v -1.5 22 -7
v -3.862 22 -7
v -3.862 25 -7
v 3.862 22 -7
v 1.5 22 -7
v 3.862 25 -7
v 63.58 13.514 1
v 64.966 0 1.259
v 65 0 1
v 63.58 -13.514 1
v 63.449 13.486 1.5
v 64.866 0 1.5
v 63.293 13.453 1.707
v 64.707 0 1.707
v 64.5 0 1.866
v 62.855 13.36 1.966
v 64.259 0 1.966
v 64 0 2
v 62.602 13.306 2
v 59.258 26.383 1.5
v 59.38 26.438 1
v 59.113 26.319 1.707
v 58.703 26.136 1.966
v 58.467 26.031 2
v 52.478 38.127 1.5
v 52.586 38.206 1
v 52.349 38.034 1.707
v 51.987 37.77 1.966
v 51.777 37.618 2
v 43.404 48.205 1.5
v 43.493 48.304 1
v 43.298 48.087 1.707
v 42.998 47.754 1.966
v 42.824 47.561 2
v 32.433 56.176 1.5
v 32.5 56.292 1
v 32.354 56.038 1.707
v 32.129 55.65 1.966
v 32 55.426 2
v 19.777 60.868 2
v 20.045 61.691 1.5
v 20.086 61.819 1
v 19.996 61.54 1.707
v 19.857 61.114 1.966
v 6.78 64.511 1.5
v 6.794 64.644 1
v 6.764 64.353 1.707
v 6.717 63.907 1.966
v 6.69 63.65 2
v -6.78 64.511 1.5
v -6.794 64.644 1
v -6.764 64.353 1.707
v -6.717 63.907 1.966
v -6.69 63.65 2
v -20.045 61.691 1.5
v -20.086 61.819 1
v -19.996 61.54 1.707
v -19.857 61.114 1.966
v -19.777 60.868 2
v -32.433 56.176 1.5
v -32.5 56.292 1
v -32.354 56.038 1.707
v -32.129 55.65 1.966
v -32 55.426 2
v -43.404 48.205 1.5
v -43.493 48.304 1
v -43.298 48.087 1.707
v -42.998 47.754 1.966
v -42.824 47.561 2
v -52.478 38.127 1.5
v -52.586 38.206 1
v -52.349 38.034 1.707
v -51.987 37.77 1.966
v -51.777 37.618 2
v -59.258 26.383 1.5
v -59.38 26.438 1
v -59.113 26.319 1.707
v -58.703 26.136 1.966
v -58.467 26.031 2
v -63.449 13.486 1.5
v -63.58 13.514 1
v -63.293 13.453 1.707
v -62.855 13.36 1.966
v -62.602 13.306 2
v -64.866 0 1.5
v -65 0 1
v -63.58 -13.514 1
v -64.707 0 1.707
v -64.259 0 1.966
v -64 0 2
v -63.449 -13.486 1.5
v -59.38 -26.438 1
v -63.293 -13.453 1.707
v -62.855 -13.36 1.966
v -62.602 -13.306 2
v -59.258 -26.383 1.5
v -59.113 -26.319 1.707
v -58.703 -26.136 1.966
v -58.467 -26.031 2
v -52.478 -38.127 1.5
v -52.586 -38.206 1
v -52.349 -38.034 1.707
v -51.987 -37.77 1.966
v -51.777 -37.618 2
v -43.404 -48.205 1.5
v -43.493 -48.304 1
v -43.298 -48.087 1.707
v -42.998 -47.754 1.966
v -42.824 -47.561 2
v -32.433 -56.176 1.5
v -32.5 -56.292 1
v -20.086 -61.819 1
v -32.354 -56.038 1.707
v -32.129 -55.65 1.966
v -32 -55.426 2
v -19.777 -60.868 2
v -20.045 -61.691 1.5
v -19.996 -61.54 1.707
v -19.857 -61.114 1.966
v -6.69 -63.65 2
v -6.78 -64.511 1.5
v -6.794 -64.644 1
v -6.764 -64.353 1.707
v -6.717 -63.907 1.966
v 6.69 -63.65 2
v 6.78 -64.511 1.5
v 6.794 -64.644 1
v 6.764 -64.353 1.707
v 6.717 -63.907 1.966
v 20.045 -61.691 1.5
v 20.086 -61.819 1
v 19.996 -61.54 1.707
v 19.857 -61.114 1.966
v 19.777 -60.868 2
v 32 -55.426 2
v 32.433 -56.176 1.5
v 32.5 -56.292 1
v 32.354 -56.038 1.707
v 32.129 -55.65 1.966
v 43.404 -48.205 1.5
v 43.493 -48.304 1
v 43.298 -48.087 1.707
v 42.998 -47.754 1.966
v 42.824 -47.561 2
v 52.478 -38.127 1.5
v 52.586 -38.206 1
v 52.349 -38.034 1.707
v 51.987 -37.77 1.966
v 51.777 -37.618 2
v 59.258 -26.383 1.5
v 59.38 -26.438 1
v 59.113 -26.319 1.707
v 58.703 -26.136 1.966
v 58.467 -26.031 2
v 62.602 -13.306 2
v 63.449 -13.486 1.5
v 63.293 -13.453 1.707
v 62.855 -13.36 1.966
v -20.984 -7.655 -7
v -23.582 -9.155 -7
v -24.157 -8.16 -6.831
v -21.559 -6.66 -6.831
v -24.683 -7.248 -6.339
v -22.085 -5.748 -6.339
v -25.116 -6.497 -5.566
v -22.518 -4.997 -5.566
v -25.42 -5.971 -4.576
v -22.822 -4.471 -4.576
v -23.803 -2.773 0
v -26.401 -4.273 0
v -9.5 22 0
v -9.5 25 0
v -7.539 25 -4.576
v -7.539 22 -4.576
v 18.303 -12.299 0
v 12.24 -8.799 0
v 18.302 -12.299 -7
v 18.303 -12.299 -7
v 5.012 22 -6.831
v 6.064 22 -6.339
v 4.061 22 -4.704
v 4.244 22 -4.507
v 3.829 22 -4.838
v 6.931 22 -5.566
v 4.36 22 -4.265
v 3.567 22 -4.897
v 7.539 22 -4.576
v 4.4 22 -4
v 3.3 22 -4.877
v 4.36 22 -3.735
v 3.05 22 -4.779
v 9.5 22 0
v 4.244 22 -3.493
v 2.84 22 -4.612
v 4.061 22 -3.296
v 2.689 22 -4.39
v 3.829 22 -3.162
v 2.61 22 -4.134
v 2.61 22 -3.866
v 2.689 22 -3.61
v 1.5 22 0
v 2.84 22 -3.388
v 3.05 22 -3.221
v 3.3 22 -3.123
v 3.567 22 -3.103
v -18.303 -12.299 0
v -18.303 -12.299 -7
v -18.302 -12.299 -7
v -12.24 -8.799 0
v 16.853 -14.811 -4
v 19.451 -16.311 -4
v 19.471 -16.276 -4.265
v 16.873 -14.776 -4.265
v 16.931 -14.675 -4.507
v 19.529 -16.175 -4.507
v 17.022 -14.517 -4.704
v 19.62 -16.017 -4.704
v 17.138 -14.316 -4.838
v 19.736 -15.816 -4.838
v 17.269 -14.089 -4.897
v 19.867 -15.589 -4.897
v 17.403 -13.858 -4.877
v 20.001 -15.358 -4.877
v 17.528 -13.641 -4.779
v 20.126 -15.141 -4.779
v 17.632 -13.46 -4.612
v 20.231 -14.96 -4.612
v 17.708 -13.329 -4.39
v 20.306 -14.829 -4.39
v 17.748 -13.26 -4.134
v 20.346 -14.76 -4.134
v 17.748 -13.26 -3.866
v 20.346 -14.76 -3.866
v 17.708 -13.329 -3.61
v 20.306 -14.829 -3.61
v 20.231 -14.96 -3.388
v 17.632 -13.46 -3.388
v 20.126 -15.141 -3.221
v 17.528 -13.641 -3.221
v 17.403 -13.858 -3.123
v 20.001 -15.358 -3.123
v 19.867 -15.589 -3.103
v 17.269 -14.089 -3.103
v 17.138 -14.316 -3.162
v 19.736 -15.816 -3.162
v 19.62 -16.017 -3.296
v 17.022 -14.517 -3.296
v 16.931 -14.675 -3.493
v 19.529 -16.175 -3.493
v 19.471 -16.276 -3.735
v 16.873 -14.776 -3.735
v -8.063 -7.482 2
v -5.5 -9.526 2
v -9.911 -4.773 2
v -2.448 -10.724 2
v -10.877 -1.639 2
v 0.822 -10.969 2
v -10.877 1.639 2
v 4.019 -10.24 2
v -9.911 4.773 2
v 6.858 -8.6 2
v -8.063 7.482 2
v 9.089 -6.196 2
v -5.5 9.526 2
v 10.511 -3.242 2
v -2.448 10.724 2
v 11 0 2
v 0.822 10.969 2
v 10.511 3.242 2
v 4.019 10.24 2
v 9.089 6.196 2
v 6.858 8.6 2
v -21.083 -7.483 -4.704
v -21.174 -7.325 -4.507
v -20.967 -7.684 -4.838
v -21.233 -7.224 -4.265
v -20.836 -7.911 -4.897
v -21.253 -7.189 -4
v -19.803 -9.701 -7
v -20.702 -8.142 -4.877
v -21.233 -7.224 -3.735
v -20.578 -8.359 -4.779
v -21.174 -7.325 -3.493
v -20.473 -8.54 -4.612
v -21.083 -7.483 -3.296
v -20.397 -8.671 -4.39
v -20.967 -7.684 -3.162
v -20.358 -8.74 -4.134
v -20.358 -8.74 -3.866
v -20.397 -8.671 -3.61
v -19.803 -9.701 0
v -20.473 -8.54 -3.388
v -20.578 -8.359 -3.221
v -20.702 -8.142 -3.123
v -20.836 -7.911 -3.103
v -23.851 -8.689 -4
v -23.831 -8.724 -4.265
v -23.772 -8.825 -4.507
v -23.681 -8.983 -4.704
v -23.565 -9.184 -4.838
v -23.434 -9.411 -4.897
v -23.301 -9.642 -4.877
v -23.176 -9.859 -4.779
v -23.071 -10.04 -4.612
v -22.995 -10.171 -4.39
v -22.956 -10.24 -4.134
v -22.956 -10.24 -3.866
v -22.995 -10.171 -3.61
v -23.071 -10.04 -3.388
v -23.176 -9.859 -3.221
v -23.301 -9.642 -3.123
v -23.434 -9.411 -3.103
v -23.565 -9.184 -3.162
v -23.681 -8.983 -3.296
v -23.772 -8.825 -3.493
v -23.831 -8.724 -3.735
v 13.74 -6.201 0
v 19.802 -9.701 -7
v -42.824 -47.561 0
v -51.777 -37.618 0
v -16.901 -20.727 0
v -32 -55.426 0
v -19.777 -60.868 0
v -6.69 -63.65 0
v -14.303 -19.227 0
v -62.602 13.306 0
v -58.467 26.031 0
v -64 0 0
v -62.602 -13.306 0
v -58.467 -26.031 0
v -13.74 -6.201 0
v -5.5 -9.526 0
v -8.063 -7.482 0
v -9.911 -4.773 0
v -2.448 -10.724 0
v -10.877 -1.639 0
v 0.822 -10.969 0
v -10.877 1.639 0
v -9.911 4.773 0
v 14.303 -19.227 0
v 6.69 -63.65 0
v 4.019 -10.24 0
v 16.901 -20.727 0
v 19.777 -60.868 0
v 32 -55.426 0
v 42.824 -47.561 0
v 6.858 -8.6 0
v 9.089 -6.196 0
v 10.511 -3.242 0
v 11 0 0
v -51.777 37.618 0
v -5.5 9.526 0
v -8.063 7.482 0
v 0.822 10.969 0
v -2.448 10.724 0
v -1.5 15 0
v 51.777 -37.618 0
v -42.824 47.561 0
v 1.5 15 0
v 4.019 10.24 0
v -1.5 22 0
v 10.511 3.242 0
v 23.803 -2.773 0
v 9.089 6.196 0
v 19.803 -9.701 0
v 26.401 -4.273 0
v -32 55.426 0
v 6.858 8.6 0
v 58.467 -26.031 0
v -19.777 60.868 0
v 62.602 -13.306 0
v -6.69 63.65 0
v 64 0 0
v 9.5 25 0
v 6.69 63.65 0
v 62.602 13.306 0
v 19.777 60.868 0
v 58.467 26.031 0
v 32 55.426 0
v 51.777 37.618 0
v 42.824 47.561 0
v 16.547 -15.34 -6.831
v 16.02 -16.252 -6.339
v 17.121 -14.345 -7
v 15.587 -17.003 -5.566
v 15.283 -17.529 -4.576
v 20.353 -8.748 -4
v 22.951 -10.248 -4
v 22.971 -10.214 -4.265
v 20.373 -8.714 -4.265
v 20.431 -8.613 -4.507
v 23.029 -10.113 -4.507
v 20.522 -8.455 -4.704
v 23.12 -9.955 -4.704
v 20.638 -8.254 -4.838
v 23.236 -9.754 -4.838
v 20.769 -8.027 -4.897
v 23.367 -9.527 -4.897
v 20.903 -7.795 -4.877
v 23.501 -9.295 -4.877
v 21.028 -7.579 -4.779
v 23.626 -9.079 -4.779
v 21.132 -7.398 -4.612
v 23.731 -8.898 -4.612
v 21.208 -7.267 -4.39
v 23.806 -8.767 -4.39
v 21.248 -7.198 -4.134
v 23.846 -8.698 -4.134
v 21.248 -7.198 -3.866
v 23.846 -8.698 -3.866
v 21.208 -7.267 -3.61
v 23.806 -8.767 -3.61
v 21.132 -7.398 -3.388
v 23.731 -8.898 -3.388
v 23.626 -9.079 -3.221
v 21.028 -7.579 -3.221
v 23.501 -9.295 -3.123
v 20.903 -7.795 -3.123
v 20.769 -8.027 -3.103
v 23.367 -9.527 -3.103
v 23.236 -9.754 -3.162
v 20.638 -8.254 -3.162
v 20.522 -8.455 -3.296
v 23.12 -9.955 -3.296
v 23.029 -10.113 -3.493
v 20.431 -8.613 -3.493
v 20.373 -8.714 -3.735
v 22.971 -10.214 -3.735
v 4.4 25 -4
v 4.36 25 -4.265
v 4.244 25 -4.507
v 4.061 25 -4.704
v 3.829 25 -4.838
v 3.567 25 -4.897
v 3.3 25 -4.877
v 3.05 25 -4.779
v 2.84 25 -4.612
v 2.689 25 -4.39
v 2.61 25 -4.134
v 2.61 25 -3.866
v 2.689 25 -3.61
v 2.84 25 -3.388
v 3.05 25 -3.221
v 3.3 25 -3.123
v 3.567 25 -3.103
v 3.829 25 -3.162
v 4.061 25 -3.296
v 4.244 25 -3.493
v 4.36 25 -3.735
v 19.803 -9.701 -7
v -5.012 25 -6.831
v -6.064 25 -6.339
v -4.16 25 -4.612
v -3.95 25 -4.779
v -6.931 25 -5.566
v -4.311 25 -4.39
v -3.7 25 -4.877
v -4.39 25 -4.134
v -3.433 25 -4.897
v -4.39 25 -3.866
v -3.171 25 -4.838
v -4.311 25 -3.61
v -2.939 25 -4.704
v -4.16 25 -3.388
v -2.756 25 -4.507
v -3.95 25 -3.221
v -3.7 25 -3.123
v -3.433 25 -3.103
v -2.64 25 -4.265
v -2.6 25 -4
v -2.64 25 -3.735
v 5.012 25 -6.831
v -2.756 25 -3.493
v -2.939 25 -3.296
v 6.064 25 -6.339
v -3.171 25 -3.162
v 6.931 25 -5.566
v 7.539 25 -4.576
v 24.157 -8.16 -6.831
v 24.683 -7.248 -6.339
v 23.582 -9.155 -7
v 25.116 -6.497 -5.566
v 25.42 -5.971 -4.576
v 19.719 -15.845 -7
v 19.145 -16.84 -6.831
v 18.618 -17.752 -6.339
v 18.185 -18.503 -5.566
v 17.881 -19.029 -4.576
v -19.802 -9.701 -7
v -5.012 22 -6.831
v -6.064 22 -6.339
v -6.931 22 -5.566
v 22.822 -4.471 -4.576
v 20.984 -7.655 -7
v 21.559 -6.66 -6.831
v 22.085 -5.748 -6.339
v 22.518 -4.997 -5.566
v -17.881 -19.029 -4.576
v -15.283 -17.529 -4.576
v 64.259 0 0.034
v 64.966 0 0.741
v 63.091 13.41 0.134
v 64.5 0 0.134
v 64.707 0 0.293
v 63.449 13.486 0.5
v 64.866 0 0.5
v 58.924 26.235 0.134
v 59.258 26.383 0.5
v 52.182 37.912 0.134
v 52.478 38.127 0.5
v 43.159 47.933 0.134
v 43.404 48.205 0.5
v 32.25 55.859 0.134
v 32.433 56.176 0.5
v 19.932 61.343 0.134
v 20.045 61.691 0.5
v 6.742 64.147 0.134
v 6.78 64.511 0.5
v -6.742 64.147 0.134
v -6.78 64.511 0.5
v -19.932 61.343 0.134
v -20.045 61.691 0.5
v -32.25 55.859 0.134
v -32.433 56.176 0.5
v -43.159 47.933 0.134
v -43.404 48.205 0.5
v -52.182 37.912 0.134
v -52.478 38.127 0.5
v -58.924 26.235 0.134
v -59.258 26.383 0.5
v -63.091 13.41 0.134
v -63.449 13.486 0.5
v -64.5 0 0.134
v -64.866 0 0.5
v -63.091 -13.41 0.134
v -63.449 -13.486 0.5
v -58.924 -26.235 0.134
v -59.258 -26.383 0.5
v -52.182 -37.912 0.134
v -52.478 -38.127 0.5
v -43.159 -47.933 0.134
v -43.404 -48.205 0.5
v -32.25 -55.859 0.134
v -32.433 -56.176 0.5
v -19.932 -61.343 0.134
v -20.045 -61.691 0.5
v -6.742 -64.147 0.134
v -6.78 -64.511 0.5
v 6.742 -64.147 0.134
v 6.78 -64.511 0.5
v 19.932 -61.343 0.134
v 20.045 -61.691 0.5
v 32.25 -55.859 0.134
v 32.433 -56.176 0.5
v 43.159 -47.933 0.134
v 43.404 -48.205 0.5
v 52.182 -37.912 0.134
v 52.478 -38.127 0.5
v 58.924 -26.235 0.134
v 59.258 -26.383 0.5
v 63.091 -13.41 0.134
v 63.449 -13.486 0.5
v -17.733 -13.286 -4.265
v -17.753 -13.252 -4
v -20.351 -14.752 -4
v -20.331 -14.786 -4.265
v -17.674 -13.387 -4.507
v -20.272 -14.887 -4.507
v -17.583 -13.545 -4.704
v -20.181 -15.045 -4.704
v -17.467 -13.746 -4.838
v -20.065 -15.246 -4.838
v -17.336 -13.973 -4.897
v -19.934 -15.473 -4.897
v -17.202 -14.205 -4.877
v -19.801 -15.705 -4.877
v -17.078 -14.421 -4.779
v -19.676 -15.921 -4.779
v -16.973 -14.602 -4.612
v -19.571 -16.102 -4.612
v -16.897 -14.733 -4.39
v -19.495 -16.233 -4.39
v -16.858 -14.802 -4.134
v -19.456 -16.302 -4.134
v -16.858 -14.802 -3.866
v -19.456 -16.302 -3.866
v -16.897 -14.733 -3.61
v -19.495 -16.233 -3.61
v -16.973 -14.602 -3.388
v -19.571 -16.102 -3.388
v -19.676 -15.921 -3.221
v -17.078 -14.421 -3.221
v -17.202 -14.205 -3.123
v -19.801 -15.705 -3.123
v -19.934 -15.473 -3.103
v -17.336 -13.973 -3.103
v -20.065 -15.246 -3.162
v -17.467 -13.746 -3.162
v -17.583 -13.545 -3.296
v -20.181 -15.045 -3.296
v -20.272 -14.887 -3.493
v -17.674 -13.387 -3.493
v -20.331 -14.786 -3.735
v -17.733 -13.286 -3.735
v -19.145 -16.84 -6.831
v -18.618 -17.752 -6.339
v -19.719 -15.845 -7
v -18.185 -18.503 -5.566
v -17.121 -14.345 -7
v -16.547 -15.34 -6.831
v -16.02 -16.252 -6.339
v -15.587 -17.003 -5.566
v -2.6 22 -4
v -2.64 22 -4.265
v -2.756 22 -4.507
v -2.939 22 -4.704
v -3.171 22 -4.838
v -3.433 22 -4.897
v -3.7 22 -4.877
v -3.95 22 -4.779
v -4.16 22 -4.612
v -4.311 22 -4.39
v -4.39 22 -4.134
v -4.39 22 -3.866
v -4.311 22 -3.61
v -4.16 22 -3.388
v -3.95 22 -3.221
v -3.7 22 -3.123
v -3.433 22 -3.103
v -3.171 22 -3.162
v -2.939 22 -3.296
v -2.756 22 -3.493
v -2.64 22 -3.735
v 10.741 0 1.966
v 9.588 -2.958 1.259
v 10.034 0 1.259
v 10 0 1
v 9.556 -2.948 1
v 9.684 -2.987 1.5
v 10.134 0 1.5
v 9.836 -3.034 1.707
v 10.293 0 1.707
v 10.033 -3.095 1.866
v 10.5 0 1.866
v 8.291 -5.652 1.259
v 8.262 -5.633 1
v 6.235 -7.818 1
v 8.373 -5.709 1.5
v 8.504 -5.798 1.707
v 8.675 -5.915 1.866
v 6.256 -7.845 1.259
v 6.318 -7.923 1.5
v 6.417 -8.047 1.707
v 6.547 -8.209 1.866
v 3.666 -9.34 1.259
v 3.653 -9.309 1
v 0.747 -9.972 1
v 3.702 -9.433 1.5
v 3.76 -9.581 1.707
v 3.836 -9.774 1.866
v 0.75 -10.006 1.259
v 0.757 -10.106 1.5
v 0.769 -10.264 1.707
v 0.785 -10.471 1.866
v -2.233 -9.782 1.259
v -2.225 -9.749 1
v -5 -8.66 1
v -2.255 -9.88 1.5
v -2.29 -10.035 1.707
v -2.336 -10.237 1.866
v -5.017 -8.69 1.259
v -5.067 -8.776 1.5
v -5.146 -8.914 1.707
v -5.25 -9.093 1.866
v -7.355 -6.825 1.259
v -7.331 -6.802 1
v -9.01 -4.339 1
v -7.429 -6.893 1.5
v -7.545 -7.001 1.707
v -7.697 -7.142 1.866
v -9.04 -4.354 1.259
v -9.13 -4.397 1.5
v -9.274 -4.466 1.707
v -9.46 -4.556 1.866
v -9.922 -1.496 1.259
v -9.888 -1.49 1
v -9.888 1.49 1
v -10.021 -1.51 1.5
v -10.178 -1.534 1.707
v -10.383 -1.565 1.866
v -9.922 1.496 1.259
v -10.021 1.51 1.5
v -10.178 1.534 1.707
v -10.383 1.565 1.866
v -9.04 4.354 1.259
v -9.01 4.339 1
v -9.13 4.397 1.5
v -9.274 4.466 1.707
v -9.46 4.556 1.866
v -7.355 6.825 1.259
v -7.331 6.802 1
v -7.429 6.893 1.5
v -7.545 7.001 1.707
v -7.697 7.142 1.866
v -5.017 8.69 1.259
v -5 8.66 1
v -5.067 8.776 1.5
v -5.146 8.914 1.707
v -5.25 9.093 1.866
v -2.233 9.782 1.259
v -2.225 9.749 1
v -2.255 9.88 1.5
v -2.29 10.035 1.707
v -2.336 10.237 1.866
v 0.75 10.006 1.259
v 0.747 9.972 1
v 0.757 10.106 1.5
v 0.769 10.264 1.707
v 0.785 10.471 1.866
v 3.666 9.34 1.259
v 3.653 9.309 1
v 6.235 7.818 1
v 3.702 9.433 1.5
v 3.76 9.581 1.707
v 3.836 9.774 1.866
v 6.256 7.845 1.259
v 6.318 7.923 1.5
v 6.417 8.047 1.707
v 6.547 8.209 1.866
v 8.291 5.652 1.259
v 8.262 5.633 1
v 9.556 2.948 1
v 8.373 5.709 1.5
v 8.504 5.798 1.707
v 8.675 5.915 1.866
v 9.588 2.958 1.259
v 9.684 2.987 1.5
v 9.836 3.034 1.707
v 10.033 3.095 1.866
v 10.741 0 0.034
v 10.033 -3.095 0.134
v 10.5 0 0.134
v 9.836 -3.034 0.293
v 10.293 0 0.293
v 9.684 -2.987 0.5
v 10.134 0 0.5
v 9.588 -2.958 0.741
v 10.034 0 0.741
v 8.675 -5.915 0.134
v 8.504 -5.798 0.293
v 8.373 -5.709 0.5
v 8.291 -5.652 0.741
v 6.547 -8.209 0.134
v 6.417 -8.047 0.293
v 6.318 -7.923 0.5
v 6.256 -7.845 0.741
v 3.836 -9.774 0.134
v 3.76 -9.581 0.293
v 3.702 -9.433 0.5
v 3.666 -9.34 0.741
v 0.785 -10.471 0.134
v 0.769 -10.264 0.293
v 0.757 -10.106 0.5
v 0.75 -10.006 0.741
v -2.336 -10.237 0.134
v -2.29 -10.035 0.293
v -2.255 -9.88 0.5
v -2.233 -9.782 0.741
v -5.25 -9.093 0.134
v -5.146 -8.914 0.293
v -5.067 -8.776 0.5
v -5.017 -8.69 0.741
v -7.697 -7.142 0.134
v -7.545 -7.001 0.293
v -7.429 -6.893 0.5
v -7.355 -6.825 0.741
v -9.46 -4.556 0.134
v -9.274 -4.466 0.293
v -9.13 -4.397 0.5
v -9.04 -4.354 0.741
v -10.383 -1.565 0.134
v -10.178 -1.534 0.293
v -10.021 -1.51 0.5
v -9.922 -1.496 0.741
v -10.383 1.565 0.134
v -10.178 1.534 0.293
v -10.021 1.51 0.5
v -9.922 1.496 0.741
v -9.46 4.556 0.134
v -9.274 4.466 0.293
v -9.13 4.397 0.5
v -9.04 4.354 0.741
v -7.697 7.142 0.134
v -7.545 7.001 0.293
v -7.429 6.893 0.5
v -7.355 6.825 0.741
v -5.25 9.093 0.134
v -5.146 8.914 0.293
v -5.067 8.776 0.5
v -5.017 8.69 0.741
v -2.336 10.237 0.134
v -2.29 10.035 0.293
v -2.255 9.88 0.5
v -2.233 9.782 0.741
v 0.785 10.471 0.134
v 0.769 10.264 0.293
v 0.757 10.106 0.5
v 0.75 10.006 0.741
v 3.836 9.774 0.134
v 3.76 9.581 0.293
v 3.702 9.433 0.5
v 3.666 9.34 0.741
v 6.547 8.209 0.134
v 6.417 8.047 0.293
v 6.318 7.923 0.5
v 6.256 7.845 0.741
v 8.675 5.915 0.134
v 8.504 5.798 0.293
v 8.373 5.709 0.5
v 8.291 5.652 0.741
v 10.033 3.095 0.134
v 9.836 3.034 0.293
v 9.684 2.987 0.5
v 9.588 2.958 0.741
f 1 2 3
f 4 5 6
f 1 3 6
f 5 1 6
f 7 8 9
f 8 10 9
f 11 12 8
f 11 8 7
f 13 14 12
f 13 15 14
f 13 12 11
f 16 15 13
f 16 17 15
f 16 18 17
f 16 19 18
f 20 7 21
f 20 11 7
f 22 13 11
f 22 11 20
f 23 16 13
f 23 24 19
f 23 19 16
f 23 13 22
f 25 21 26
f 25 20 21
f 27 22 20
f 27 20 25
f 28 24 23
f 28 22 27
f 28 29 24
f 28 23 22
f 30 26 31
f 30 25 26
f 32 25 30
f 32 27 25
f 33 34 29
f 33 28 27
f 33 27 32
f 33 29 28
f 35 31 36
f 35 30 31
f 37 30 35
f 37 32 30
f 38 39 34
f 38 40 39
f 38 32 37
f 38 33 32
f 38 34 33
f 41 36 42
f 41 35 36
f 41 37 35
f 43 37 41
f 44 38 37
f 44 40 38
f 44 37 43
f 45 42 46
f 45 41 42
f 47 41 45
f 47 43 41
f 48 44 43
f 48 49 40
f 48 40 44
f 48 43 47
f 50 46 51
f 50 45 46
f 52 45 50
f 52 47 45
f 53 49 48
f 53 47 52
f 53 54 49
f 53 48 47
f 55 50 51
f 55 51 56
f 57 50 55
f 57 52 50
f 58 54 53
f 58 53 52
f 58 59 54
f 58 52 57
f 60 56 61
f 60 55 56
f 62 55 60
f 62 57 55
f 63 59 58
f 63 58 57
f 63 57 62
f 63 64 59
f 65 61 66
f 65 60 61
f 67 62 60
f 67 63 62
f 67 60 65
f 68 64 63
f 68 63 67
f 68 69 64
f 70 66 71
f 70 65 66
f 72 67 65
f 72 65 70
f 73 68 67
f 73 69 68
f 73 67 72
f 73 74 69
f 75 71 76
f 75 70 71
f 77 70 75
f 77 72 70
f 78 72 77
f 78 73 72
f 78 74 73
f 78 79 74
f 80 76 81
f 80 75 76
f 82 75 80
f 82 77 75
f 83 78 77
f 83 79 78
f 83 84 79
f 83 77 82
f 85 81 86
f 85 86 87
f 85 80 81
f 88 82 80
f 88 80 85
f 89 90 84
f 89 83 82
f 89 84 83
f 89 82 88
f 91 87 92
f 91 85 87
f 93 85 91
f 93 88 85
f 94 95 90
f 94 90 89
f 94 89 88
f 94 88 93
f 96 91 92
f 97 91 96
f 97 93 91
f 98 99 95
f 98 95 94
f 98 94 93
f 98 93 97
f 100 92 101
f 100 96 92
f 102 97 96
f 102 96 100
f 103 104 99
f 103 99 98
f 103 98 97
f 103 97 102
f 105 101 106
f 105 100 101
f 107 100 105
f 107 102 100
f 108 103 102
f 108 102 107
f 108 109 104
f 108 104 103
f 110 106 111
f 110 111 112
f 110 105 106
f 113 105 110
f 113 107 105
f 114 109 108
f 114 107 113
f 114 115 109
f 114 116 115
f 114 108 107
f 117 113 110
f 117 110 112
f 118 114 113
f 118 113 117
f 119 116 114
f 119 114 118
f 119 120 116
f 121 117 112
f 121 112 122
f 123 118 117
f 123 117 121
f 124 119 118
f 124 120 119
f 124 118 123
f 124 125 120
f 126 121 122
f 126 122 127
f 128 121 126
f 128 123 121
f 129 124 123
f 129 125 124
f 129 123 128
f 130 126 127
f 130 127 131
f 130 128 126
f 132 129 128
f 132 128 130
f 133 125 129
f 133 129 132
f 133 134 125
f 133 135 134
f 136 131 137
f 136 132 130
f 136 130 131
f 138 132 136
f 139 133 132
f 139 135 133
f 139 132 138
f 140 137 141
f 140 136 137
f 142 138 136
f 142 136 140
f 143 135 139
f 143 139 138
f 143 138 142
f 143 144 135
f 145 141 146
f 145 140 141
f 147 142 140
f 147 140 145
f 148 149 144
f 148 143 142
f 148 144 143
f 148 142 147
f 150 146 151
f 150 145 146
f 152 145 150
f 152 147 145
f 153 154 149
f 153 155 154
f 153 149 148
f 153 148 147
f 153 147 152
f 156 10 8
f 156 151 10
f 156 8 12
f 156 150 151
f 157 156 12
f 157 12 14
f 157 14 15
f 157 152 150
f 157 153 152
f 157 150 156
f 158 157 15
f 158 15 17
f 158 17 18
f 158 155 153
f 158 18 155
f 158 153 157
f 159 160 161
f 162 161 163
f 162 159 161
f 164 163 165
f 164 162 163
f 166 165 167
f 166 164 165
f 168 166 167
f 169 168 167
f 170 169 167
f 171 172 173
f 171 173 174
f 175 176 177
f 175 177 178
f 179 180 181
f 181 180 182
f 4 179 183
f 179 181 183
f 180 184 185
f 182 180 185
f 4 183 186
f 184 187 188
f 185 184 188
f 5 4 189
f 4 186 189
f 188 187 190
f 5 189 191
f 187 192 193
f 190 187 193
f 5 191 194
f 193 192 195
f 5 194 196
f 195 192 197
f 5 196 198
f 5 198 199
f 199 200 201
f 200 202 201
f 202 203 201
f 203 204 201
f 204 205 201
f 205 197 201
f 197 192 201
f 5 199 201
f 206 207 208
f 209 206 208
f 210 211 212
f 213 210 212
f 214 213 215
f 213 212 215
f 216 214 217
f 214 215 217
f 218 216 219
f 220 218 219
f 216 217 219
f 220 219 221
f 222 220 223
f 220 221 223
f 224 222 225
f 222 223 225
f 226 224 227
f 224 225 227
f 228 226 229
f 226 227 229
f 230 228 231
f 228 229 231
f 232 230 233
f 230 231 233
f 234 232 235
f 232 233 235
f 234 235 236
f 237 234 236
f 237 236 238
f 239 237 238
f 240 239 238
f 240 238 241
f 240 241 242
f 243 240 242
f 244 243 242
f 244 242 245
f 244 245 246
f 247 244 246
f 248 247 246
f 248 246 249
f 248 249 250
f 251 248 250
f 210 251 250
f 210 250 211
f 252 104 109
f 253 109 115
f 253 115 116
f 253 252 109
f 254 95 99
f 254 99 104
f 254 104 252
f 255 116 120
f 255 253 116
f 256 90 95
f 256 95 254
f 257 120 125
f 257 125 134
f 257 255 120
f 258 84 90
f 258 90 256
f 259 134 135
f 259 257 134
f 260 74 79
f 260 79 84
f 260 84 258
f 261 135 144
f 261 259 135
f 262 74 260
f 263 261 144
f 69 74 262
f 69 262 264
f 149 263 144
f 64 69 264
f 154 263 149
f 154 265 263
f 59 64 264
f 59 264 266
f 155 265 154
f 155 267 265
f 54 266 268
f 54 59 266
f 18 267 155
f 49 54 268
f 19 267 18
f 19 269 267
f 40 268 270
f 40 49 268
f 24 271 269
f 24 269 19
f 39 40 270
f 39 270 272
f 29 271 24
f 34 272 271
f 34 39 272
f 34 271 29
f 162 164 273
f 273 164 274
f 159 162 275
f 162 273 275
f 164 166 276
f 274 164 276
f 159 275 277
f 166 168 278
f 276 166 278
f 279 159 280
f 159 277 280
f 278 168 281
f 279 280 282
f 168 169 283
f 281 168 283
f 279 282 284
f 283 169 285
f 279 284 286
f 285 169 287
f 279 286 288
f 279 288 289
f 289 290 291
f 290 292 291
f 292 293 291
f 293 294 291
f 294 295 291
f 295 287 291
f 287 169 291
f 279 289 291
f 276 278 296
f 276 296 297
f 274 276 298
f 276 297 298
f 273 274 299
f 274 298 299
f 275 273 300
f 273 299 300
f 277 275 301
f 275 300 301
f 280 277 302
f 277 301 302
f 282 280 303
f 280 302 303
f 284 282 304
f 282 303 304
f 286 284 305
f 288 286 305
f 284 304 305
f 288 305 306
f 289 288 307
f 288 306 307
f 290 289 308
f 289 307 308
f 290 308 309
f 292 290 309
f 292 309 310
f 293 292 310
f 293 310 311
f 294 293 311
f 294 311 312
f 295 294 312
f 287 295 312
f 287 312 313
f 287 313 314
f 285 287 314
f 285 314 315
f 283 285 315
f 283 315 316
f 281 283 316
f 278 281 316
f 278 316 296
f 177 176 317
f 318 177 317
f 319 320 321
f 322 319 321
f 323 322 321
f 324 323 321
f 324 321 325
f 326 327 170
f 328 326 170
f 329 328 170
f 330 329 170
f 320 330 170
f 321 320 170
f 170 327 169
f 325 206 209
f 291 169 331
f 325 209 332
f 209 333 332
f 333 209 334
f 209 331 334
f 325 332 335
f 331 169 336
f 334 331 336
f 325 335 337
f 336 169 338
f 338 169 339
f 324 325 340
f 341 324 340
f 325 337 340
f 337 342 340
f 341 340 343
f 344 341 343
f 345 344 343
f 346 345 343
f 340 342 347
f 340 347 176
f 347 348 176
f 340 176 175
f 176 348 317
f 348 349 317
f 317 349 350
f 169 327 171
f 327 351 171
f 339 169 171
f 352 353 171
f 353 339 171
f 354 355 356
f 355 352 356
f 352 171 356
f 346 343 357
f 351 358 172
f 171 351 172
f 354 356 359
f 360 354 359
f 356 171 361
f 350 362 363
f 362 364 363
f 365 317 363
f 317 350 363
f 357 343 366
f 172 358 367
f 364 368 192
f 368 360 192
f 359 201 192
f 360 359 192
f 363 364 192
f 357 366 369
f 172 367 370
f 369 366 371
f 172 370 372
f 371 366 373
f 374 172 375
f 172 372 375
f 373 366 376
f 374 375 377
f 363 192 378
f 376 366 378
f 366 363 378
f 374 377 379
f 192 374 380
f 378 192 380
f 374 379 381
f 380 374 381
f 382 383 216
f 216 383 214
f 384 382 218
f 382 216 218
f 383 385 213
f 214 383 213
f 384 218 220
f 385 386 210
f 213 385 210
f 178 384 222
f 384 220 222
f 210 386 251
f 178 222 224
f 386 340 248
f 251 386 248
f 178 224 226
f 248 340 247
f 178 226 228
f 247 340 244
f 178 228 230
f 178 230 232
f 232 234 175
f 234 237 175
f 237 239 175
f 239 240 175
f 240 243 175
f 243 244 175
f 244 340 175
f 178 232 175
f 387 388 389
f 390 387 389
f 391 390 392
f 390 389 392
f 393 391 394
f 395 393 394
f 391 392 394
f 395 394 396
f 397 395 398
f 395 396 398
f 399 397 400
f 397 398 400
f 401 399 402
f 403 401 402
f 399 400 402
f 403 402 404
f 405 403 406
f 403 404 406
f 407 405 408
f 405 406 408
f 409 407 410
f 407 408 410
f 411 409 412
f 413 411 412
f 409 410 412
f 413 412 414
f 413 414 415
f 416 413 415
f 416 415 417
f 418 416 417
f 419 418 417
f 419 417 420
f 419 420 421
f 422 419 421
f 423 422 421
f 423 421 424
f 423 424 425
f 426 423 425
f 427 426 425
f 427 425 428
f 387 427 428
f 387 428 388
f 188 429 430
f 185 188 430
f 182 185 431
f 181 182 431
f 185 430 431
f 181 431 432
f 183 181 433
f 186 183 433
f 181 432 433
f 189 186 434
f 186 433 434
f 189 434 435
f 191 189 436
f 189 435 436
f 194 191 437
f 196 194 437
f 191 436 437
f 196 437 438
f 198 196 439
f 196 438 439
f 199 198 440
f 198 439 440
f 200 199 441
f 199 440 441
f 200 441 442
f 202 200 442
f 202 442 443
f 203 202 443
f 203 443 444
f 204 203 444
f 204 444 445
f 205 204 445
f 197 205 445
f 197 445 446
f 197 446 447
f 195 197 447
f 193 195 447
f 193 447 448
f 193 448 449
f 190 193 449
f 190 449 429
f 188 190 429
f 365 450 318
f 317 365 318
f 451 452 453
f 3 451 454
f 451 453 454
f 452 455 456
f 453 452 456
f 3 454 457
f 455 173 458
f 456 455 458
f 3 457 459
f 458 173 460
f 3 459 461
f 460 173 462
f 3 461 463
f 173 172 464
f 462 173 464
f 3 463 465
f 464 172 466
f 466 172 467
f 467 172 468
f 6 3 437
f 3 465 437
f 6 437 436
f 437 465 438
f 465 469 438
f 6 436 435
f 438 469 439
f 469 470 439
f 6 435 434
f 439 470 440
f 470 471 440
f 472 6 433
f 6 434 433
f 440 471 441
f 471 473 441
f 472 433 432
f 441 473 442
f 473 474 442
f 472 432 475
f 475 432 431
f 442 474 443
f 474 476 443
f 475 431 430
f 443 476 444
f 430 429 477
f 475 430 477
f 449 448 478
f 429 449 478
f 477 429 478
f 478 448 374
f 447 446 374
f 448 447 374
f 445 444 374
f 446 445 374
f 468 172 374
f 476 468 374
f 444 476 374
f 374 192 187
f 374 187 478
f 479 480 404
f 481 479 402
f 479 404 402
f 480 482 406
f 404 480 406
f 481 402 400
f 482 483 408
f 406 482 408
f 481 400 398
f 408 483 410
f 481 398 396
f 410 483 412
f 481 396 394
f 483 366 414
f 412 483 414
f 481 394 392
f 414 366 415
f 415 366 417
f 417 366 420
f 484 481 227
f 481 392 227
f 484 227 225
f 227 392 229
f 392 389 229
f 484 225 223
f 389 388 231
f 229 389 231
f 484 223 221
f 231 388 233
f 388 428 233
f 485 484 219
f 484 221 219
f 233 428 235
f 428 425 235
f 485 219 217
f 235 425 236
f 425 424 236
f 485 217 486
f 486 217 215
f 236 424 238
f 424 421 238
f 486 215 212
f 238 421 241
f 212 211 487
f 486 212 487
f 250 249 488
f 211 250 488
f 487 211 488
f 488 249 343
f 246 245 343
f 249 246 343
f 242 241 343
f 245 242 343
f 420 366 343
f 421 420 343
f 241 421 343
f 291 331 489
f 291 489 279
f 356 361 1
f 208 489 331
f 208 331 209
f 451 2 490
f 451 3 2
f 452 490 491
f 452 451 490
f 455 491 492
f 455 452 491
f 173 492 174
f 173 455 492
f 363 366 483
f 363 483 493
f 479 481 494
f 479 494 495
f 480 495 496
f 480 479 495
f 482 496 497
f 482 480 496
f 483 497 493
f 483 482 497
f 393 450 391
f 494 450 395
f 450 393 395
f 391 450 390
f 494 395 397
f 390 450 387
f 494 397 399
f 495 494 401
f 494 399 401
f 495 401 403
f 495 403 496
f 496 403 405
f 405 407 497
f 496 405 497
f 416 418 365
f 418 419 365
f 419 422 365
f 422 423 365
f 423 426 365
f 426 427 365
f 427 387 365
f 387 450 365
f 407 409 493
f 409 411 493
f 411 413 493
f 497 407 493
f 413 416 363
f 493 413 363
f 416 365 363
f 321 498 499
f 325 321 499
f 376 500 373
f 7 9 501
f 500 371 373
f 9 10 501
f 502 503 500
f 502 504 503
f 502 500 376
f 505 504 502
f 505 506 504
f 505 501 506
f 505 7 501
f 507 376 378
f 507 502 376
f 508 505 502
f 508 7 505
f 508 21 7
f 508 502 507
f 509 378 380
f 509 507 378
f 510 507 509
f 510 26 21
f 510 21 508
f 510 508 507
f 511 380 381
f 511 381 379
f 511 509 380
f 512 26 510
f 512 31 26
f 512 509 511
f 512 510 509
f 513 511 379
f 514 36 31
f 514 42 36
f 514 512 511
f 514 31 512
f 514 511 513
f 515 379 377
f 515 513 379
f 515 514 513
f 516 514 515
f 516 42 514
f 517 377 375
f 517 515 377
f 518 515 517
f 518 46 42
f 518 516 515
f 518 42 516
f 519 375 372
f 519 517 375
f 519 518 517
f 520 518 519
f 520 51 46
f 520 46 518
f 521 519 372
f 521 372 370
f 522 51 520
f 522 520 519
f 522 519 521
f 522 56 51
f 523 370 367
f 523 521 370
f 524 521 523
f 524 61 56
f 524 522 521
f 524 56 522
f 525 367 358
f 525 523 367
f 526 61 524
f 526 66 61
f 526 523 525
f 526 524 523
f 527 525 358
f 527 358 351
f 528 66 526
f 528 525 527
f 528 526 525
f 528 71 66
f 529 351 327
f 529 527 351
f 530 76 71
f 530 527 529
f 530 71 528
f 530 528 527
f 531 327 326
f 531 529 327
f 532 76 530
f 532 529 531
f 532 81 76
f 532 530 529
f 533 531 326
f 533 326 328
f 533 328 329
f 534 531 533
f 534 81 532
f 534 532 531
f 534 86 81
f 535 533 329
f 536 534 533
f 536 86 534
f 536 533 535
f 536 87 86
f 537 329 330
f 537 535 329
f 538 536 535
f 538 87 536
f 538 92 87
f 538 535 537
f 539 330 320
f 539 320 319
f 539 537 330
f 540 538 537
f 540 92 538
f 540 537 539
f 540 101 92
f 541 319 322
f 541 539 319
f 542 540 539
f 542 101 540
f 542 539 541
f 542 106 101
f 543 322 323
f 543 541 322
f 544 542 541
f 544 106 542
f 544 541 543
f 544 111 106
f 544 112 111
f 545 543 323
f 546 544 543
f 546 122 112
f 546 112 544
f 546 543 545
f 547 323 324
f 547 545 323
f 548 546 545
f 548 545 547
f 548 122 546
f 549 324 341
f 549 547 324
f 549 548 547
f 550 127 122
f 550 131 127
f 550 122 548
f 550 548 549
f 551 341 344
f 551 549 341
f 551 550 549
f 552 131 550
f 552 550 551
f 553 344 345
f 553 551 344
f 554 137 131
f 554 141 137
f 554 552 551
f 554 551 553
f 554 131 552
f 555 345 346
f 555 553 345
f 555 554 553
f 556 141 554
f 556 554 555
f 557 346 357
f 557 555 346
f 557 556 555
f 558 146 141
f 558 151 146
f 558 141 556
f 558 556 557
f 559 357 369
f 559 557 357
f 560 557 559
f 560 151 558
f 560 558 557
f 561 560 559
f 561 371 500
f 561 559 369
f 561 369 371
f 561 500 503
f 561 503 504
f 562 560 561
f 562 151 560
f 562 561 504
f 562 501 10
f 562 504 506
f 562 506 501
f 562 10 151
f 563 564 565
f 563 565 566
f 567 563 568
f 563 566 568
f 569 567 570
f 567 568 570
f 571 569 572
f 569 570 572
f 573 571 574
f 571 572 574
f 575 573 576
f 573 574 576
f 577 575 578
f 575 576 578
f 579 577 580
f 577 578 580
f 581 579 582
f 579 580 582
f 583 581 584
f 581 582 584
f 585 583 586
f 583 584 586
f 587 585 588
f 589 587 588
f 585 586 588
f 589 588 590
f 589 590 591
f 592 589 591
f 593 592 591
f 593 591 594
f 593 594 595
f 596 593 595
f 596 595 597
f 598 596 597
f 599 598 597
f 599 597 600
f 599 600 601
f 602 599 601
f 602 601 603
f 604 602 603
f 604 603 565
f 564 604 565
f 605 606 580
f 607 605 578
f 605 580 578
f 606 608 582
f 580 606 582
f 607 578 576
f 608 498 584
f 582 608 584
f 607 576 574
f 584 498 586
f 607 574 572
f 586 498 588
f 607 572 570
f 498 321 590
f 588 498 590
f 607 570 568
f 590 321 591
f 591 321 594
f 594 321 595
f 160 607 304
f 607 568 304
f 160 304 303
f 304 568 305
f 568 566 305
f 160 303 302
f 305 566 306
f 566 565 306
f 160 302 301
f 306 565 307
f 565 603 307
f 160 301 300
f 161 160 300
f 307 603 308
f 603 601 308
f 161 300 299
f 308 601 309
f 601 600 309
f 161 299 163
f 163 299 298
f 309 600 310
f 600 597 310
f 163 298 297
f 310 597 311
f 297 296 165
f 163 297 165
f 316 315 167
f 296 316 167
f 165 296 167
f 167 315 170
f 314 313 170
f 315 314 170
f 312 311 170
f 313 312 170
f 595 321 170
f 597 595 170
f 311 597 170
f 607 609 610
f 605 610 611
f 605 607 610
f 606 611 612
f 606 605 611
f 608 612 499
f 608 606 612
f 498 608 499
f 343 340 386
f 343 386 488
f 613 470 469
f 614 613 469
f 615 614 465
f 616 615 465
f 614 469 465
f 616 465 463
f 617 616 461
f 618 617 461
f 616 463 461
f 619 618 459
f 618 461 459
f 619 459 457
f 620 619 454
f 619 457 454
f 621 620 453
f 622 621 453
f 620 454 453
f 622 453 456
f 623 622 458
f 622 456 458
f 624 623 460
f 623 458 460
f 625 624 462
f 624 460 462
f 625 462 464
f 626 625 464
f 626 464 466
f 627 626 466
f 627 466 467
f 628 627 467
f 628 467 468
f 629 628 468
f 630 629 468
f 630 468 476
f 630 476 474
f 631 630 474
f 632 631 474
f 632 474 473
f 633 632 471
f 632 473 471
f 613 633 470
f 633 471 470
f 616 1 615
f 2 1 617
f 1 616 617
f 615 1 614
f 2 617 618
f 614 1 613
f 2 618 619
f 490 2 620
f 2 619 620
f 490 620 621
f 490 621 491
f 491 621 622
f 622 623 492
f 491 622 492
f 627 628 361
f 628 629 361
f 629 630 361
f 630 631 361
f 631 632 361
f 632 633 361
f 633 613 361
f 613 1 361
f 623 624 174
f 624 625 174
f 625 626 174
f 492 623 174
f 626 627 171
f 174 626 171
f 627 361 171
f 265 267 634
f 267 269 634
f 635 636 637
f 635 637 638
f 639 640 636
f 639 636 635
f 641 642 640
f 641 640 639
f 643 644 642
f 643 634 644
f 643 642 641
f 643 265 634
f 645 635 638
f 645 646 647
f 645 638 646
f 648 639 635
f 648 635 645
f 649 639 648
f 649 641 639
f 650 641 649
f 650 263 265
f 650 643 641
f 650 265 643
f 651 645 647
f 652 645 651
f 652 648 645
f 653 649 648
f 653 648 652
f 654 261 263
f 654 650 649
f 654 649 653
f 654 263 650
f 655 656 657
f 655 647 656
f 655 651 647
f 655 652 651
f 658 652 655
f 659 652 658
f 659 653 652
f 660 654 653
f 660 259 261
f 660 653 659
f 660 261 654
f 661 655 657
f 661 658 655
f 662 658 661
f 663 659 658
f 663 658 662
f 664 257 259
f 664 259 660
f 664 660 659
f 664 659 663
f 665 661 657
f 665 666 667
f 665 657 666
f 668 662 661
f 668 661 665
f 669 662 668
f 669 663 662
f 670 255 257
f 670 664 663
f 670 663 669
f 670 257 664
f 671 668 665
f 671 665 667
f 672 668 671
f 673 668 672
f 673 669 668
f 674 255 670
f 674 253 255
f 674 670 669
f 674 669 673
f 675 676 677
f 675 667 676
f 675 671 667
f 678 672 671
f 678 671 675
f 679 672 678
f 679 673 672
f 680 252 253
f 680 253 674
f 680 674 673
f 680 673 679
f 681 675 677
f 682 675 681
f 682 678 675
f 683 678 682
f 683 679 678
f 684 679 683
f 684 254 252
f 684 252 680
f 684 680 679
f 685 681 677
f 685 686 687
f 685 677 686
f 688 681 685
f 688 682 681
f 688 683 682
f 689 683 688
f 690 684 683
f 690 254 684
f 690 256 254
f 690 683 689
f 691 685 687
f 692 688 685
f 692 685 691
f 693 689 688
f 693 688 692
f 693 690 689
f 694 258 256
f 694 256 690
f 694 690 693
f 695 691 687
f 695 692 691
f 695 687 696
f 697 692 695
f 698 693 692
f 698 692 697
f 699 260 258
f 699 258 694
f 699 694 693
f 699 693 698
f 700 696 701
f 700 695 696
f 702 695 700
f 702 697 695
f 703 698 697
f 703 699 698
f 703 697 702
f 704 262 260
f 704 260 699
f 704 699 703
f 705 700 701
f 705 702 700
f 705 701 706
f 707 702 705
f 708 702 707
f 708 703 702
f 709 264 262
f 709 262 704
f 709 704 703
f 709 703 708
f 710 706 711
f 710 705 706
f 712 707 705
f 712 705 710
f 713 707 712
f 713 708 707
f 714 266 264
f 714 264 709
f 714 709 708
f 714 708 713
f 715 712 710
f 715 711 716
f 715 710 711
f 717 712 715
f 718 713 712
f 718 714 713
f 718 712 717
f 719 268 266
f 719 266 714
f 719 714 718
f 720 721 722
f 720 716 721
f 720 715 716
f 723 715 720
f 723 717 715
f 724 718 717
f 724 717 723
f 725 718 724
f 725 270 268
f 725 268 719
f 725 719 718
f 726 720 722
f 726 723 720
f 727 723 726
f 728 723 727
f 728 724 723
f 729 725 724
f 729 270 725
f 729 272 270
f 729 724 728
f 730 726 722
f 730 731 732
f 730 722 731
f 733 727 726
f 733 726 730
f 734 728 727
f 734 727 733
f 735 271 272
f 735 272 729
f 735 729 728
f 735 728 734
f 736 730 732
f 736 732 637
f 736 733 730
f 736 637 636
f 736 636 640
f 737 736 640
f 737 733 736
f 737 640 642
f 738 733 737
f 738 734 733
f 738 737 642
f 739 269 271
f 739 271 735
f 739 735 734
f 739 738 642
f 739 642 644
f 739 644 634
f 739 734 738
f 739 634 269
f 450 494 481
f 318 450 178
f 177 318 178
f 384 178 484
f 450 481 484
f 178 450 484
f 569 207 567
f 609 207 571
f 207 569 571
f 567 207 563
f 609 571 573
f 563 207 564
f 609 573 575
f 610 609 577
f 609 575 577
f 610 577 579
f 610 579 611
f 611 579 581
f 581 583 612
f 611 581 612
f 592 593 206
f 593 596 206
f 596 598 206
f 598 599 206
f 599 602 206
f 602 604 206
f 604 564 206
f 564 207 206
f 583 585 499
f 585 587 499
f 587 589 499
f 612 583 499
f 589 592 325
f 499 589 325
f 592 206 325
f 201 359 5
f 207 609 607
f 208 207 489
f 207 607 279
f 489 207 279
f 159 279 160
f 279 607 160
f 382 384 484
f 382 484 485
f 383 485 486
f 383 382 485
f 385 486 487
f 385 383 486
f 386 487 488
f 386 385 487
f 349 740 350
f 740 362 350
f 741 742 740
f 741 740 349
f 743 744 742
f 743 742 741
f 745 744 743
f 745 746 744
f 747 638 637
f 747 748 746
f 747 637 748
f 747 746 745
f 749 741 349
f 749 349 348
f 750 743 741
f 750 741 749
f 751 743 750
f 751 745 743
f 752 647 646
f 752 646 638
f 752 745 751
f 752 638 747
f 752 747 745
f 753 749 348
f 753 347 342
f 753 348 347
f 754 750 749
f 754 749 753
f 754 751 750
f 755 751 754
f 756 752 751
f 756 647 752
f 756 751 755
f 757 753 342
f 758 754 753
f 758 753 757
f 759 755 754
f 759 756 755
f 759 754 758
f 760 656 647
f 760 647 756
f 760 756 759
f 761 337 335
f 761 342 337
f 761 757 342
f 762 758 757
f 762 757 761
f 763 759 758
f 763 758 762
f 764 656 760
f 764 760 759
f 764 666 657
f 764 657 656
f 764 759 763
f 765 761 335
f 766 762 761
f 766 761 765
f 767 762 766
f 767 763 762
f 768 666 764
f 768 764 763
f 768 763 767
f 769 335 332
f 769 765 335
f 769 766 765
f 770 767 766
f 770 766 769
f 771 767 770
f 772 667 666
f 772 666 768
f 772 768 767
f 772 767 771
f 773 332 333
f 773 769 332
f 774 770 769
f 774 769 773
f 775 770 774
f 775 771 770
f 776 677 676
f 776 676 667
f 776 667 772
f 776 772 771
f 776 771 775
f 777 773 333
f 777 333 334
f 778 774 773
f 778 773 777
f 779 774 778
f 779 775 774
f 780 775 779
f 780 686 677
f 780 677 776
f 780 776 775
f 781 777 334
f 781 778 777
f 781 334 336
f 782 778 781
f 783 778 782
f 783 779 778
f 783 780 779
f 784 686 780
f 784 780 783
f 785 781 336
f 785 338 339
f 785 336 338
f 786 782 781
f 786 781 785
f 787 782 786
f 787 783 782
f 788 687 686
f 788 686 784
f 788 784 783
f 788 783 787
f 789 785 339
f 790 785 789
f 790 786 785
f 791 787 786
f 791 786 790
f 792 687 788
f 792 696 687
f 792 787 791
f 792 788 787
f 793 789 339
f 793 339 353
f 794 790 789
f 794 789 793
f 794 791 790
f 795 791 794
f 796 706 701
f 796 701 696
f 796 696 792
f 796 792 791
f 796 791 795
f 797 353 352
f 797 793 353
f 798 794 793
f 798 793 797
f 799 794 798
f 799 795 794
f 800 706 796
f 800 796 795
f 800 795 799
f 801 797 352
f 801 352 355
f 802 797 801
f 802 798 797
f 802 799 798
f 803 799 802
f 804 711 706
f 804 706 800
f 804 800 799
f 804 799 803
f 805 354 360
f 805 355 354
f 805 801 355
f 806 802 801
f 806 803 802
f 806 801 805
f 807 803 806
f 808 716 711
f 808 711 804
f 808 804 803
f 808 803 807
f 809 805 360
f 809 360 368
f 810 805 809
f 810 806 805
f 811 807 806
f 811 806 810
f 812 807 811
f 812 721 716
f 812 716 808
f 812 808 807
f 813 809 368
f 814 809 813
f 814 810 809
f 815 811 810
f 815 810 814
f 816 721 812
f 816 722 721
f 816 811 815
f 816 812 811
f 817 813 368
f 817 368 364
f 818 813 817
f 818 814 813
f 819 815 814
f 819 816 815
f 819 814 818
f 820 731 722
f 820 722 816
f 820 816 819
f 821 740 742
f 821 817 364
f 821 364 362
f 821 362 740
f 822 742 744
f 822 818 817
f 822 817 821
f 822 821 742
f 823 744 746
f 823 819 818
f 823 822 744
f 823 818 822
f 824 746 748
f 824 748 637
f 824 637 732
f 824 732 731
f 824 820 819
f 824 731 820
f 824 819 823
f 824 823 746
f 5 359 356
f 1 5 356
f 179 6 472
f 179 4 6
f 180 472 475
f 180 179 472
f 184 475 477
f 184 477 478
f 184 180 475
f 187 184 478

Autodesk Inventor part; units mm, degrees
ref_plane "YZ Plane" through (0, 0, 0) normal (1, 0, 0) x (0, 1, 0)
ref_plane "XZ Plane" through (0, 0, 0) normal (0, 1, 0) x (-1, 0, 0)
ref_plane "XY Plane" through (0, 0, 0) normal (0, 0, 1) x (1, 0, 0)
sketch "Skizze1" plane through (0, 0, 0) normal (0, 0, 1) x (1, 0, 0)
  line L0 (-91, 0) -> (91, 0) construction
  circle A0 centre (0, 0) radius 65
  line L1 (-9.5, 25) -> (9.5, 25)
  line L2 (9.5, 25) -> (9.5, 22)
  line L3 (9.5, 22) -> (-9.5, 22)
  line L4 (-9.5, 22) -> (-9.5, 25)
  line L5 (1.5, 22) -> (-1.5, 22)
  line L6 (-1.5, 22) -> (-1.5, 15)
  line L7 (-1.5, 15) -> (1.5, 15)
  line L8 (1.5, 15) -> (1.5, 22)
  circle A1 centre (0, 0) radius 10
  line L9 (0, 91) -> (0, -91) construction
  dimension "d9" = 130
  dimension "d10" = 3
  dimension "d14" = 19
  dimension "d23" = 7
  dimension "d62" = 20
  dimension "d149" = 25
extrude "Extrusion3" add sketch "Skizze1" against normal blind 7 contours L1 L2 L3 L4 | L3 L8 L7 L6
chamfer "Fase2" distance 3 distance2 7 1 edges at (-9.5, 23.5, -7) measured on face at (-0.5, 24, -7)
chamfer "Fase3" distance 3 distance2 7 1 edges at (9.5, 23.5, -7) measured on face at (1.5, 24, -7)
fillet "Rundung1" radius 4 2 edges at (-6.5001, 23.5, -7) (6.5001, 23.5, -7)
sketch "Skizze2" plane through (-9.5, 25, 0) normal (0, 1, 0) x (1, 0, 0)
  circle A0 centre (6, 4) radius 0.9
  circle A1 centre (13, 4) radius 0.9
  line L0 (43, 0) -> (-27, 0) construction
  line L1 (-1.6221, 4) -> (19.0112, 4) construction
  line L2 (3, 7) -> (16, 7) construction
  line L3 (0, 0) -> (0, 3) projected
  line L4 (9.5, 8.4) -> (9.5, -1.4) construction
  point P0 (9.5, 0)
  point P1 (4, 7)
  point P2 (11, 7)
  dimension "d16" = 1.8
  dimension "d20" = 3
  dimension "d150" = 7
extrude "Extrusion4" cut sketch "Skizze2" against normal up to next
chamfer "Fase1" distance 7 distance2 7 1 edges at (0, 15, -7) measured on face at (0.5, 24, -7)
pattern_circular "Runde Anordnung1" count 3 over 360 about axis through (0, 0, -10) along (0, 0, 1) of "Extrusion4", "Extrusion3", "Fase2", "Fase3", "Rundung1", "Fase1"
extrude "Extrusion11" add sketch "Skizze1" along normal blind 2 contours A0 | L1 L2 L3 L4 | L3 L8 L7 L6
fillet "Rundung5" radius 1 4 edges at (-65, 0, 2) (-10, 0, 2) (-10, 0, 0) (-65, 0, 0)
properties part number "Stewart-Plate-Head"
